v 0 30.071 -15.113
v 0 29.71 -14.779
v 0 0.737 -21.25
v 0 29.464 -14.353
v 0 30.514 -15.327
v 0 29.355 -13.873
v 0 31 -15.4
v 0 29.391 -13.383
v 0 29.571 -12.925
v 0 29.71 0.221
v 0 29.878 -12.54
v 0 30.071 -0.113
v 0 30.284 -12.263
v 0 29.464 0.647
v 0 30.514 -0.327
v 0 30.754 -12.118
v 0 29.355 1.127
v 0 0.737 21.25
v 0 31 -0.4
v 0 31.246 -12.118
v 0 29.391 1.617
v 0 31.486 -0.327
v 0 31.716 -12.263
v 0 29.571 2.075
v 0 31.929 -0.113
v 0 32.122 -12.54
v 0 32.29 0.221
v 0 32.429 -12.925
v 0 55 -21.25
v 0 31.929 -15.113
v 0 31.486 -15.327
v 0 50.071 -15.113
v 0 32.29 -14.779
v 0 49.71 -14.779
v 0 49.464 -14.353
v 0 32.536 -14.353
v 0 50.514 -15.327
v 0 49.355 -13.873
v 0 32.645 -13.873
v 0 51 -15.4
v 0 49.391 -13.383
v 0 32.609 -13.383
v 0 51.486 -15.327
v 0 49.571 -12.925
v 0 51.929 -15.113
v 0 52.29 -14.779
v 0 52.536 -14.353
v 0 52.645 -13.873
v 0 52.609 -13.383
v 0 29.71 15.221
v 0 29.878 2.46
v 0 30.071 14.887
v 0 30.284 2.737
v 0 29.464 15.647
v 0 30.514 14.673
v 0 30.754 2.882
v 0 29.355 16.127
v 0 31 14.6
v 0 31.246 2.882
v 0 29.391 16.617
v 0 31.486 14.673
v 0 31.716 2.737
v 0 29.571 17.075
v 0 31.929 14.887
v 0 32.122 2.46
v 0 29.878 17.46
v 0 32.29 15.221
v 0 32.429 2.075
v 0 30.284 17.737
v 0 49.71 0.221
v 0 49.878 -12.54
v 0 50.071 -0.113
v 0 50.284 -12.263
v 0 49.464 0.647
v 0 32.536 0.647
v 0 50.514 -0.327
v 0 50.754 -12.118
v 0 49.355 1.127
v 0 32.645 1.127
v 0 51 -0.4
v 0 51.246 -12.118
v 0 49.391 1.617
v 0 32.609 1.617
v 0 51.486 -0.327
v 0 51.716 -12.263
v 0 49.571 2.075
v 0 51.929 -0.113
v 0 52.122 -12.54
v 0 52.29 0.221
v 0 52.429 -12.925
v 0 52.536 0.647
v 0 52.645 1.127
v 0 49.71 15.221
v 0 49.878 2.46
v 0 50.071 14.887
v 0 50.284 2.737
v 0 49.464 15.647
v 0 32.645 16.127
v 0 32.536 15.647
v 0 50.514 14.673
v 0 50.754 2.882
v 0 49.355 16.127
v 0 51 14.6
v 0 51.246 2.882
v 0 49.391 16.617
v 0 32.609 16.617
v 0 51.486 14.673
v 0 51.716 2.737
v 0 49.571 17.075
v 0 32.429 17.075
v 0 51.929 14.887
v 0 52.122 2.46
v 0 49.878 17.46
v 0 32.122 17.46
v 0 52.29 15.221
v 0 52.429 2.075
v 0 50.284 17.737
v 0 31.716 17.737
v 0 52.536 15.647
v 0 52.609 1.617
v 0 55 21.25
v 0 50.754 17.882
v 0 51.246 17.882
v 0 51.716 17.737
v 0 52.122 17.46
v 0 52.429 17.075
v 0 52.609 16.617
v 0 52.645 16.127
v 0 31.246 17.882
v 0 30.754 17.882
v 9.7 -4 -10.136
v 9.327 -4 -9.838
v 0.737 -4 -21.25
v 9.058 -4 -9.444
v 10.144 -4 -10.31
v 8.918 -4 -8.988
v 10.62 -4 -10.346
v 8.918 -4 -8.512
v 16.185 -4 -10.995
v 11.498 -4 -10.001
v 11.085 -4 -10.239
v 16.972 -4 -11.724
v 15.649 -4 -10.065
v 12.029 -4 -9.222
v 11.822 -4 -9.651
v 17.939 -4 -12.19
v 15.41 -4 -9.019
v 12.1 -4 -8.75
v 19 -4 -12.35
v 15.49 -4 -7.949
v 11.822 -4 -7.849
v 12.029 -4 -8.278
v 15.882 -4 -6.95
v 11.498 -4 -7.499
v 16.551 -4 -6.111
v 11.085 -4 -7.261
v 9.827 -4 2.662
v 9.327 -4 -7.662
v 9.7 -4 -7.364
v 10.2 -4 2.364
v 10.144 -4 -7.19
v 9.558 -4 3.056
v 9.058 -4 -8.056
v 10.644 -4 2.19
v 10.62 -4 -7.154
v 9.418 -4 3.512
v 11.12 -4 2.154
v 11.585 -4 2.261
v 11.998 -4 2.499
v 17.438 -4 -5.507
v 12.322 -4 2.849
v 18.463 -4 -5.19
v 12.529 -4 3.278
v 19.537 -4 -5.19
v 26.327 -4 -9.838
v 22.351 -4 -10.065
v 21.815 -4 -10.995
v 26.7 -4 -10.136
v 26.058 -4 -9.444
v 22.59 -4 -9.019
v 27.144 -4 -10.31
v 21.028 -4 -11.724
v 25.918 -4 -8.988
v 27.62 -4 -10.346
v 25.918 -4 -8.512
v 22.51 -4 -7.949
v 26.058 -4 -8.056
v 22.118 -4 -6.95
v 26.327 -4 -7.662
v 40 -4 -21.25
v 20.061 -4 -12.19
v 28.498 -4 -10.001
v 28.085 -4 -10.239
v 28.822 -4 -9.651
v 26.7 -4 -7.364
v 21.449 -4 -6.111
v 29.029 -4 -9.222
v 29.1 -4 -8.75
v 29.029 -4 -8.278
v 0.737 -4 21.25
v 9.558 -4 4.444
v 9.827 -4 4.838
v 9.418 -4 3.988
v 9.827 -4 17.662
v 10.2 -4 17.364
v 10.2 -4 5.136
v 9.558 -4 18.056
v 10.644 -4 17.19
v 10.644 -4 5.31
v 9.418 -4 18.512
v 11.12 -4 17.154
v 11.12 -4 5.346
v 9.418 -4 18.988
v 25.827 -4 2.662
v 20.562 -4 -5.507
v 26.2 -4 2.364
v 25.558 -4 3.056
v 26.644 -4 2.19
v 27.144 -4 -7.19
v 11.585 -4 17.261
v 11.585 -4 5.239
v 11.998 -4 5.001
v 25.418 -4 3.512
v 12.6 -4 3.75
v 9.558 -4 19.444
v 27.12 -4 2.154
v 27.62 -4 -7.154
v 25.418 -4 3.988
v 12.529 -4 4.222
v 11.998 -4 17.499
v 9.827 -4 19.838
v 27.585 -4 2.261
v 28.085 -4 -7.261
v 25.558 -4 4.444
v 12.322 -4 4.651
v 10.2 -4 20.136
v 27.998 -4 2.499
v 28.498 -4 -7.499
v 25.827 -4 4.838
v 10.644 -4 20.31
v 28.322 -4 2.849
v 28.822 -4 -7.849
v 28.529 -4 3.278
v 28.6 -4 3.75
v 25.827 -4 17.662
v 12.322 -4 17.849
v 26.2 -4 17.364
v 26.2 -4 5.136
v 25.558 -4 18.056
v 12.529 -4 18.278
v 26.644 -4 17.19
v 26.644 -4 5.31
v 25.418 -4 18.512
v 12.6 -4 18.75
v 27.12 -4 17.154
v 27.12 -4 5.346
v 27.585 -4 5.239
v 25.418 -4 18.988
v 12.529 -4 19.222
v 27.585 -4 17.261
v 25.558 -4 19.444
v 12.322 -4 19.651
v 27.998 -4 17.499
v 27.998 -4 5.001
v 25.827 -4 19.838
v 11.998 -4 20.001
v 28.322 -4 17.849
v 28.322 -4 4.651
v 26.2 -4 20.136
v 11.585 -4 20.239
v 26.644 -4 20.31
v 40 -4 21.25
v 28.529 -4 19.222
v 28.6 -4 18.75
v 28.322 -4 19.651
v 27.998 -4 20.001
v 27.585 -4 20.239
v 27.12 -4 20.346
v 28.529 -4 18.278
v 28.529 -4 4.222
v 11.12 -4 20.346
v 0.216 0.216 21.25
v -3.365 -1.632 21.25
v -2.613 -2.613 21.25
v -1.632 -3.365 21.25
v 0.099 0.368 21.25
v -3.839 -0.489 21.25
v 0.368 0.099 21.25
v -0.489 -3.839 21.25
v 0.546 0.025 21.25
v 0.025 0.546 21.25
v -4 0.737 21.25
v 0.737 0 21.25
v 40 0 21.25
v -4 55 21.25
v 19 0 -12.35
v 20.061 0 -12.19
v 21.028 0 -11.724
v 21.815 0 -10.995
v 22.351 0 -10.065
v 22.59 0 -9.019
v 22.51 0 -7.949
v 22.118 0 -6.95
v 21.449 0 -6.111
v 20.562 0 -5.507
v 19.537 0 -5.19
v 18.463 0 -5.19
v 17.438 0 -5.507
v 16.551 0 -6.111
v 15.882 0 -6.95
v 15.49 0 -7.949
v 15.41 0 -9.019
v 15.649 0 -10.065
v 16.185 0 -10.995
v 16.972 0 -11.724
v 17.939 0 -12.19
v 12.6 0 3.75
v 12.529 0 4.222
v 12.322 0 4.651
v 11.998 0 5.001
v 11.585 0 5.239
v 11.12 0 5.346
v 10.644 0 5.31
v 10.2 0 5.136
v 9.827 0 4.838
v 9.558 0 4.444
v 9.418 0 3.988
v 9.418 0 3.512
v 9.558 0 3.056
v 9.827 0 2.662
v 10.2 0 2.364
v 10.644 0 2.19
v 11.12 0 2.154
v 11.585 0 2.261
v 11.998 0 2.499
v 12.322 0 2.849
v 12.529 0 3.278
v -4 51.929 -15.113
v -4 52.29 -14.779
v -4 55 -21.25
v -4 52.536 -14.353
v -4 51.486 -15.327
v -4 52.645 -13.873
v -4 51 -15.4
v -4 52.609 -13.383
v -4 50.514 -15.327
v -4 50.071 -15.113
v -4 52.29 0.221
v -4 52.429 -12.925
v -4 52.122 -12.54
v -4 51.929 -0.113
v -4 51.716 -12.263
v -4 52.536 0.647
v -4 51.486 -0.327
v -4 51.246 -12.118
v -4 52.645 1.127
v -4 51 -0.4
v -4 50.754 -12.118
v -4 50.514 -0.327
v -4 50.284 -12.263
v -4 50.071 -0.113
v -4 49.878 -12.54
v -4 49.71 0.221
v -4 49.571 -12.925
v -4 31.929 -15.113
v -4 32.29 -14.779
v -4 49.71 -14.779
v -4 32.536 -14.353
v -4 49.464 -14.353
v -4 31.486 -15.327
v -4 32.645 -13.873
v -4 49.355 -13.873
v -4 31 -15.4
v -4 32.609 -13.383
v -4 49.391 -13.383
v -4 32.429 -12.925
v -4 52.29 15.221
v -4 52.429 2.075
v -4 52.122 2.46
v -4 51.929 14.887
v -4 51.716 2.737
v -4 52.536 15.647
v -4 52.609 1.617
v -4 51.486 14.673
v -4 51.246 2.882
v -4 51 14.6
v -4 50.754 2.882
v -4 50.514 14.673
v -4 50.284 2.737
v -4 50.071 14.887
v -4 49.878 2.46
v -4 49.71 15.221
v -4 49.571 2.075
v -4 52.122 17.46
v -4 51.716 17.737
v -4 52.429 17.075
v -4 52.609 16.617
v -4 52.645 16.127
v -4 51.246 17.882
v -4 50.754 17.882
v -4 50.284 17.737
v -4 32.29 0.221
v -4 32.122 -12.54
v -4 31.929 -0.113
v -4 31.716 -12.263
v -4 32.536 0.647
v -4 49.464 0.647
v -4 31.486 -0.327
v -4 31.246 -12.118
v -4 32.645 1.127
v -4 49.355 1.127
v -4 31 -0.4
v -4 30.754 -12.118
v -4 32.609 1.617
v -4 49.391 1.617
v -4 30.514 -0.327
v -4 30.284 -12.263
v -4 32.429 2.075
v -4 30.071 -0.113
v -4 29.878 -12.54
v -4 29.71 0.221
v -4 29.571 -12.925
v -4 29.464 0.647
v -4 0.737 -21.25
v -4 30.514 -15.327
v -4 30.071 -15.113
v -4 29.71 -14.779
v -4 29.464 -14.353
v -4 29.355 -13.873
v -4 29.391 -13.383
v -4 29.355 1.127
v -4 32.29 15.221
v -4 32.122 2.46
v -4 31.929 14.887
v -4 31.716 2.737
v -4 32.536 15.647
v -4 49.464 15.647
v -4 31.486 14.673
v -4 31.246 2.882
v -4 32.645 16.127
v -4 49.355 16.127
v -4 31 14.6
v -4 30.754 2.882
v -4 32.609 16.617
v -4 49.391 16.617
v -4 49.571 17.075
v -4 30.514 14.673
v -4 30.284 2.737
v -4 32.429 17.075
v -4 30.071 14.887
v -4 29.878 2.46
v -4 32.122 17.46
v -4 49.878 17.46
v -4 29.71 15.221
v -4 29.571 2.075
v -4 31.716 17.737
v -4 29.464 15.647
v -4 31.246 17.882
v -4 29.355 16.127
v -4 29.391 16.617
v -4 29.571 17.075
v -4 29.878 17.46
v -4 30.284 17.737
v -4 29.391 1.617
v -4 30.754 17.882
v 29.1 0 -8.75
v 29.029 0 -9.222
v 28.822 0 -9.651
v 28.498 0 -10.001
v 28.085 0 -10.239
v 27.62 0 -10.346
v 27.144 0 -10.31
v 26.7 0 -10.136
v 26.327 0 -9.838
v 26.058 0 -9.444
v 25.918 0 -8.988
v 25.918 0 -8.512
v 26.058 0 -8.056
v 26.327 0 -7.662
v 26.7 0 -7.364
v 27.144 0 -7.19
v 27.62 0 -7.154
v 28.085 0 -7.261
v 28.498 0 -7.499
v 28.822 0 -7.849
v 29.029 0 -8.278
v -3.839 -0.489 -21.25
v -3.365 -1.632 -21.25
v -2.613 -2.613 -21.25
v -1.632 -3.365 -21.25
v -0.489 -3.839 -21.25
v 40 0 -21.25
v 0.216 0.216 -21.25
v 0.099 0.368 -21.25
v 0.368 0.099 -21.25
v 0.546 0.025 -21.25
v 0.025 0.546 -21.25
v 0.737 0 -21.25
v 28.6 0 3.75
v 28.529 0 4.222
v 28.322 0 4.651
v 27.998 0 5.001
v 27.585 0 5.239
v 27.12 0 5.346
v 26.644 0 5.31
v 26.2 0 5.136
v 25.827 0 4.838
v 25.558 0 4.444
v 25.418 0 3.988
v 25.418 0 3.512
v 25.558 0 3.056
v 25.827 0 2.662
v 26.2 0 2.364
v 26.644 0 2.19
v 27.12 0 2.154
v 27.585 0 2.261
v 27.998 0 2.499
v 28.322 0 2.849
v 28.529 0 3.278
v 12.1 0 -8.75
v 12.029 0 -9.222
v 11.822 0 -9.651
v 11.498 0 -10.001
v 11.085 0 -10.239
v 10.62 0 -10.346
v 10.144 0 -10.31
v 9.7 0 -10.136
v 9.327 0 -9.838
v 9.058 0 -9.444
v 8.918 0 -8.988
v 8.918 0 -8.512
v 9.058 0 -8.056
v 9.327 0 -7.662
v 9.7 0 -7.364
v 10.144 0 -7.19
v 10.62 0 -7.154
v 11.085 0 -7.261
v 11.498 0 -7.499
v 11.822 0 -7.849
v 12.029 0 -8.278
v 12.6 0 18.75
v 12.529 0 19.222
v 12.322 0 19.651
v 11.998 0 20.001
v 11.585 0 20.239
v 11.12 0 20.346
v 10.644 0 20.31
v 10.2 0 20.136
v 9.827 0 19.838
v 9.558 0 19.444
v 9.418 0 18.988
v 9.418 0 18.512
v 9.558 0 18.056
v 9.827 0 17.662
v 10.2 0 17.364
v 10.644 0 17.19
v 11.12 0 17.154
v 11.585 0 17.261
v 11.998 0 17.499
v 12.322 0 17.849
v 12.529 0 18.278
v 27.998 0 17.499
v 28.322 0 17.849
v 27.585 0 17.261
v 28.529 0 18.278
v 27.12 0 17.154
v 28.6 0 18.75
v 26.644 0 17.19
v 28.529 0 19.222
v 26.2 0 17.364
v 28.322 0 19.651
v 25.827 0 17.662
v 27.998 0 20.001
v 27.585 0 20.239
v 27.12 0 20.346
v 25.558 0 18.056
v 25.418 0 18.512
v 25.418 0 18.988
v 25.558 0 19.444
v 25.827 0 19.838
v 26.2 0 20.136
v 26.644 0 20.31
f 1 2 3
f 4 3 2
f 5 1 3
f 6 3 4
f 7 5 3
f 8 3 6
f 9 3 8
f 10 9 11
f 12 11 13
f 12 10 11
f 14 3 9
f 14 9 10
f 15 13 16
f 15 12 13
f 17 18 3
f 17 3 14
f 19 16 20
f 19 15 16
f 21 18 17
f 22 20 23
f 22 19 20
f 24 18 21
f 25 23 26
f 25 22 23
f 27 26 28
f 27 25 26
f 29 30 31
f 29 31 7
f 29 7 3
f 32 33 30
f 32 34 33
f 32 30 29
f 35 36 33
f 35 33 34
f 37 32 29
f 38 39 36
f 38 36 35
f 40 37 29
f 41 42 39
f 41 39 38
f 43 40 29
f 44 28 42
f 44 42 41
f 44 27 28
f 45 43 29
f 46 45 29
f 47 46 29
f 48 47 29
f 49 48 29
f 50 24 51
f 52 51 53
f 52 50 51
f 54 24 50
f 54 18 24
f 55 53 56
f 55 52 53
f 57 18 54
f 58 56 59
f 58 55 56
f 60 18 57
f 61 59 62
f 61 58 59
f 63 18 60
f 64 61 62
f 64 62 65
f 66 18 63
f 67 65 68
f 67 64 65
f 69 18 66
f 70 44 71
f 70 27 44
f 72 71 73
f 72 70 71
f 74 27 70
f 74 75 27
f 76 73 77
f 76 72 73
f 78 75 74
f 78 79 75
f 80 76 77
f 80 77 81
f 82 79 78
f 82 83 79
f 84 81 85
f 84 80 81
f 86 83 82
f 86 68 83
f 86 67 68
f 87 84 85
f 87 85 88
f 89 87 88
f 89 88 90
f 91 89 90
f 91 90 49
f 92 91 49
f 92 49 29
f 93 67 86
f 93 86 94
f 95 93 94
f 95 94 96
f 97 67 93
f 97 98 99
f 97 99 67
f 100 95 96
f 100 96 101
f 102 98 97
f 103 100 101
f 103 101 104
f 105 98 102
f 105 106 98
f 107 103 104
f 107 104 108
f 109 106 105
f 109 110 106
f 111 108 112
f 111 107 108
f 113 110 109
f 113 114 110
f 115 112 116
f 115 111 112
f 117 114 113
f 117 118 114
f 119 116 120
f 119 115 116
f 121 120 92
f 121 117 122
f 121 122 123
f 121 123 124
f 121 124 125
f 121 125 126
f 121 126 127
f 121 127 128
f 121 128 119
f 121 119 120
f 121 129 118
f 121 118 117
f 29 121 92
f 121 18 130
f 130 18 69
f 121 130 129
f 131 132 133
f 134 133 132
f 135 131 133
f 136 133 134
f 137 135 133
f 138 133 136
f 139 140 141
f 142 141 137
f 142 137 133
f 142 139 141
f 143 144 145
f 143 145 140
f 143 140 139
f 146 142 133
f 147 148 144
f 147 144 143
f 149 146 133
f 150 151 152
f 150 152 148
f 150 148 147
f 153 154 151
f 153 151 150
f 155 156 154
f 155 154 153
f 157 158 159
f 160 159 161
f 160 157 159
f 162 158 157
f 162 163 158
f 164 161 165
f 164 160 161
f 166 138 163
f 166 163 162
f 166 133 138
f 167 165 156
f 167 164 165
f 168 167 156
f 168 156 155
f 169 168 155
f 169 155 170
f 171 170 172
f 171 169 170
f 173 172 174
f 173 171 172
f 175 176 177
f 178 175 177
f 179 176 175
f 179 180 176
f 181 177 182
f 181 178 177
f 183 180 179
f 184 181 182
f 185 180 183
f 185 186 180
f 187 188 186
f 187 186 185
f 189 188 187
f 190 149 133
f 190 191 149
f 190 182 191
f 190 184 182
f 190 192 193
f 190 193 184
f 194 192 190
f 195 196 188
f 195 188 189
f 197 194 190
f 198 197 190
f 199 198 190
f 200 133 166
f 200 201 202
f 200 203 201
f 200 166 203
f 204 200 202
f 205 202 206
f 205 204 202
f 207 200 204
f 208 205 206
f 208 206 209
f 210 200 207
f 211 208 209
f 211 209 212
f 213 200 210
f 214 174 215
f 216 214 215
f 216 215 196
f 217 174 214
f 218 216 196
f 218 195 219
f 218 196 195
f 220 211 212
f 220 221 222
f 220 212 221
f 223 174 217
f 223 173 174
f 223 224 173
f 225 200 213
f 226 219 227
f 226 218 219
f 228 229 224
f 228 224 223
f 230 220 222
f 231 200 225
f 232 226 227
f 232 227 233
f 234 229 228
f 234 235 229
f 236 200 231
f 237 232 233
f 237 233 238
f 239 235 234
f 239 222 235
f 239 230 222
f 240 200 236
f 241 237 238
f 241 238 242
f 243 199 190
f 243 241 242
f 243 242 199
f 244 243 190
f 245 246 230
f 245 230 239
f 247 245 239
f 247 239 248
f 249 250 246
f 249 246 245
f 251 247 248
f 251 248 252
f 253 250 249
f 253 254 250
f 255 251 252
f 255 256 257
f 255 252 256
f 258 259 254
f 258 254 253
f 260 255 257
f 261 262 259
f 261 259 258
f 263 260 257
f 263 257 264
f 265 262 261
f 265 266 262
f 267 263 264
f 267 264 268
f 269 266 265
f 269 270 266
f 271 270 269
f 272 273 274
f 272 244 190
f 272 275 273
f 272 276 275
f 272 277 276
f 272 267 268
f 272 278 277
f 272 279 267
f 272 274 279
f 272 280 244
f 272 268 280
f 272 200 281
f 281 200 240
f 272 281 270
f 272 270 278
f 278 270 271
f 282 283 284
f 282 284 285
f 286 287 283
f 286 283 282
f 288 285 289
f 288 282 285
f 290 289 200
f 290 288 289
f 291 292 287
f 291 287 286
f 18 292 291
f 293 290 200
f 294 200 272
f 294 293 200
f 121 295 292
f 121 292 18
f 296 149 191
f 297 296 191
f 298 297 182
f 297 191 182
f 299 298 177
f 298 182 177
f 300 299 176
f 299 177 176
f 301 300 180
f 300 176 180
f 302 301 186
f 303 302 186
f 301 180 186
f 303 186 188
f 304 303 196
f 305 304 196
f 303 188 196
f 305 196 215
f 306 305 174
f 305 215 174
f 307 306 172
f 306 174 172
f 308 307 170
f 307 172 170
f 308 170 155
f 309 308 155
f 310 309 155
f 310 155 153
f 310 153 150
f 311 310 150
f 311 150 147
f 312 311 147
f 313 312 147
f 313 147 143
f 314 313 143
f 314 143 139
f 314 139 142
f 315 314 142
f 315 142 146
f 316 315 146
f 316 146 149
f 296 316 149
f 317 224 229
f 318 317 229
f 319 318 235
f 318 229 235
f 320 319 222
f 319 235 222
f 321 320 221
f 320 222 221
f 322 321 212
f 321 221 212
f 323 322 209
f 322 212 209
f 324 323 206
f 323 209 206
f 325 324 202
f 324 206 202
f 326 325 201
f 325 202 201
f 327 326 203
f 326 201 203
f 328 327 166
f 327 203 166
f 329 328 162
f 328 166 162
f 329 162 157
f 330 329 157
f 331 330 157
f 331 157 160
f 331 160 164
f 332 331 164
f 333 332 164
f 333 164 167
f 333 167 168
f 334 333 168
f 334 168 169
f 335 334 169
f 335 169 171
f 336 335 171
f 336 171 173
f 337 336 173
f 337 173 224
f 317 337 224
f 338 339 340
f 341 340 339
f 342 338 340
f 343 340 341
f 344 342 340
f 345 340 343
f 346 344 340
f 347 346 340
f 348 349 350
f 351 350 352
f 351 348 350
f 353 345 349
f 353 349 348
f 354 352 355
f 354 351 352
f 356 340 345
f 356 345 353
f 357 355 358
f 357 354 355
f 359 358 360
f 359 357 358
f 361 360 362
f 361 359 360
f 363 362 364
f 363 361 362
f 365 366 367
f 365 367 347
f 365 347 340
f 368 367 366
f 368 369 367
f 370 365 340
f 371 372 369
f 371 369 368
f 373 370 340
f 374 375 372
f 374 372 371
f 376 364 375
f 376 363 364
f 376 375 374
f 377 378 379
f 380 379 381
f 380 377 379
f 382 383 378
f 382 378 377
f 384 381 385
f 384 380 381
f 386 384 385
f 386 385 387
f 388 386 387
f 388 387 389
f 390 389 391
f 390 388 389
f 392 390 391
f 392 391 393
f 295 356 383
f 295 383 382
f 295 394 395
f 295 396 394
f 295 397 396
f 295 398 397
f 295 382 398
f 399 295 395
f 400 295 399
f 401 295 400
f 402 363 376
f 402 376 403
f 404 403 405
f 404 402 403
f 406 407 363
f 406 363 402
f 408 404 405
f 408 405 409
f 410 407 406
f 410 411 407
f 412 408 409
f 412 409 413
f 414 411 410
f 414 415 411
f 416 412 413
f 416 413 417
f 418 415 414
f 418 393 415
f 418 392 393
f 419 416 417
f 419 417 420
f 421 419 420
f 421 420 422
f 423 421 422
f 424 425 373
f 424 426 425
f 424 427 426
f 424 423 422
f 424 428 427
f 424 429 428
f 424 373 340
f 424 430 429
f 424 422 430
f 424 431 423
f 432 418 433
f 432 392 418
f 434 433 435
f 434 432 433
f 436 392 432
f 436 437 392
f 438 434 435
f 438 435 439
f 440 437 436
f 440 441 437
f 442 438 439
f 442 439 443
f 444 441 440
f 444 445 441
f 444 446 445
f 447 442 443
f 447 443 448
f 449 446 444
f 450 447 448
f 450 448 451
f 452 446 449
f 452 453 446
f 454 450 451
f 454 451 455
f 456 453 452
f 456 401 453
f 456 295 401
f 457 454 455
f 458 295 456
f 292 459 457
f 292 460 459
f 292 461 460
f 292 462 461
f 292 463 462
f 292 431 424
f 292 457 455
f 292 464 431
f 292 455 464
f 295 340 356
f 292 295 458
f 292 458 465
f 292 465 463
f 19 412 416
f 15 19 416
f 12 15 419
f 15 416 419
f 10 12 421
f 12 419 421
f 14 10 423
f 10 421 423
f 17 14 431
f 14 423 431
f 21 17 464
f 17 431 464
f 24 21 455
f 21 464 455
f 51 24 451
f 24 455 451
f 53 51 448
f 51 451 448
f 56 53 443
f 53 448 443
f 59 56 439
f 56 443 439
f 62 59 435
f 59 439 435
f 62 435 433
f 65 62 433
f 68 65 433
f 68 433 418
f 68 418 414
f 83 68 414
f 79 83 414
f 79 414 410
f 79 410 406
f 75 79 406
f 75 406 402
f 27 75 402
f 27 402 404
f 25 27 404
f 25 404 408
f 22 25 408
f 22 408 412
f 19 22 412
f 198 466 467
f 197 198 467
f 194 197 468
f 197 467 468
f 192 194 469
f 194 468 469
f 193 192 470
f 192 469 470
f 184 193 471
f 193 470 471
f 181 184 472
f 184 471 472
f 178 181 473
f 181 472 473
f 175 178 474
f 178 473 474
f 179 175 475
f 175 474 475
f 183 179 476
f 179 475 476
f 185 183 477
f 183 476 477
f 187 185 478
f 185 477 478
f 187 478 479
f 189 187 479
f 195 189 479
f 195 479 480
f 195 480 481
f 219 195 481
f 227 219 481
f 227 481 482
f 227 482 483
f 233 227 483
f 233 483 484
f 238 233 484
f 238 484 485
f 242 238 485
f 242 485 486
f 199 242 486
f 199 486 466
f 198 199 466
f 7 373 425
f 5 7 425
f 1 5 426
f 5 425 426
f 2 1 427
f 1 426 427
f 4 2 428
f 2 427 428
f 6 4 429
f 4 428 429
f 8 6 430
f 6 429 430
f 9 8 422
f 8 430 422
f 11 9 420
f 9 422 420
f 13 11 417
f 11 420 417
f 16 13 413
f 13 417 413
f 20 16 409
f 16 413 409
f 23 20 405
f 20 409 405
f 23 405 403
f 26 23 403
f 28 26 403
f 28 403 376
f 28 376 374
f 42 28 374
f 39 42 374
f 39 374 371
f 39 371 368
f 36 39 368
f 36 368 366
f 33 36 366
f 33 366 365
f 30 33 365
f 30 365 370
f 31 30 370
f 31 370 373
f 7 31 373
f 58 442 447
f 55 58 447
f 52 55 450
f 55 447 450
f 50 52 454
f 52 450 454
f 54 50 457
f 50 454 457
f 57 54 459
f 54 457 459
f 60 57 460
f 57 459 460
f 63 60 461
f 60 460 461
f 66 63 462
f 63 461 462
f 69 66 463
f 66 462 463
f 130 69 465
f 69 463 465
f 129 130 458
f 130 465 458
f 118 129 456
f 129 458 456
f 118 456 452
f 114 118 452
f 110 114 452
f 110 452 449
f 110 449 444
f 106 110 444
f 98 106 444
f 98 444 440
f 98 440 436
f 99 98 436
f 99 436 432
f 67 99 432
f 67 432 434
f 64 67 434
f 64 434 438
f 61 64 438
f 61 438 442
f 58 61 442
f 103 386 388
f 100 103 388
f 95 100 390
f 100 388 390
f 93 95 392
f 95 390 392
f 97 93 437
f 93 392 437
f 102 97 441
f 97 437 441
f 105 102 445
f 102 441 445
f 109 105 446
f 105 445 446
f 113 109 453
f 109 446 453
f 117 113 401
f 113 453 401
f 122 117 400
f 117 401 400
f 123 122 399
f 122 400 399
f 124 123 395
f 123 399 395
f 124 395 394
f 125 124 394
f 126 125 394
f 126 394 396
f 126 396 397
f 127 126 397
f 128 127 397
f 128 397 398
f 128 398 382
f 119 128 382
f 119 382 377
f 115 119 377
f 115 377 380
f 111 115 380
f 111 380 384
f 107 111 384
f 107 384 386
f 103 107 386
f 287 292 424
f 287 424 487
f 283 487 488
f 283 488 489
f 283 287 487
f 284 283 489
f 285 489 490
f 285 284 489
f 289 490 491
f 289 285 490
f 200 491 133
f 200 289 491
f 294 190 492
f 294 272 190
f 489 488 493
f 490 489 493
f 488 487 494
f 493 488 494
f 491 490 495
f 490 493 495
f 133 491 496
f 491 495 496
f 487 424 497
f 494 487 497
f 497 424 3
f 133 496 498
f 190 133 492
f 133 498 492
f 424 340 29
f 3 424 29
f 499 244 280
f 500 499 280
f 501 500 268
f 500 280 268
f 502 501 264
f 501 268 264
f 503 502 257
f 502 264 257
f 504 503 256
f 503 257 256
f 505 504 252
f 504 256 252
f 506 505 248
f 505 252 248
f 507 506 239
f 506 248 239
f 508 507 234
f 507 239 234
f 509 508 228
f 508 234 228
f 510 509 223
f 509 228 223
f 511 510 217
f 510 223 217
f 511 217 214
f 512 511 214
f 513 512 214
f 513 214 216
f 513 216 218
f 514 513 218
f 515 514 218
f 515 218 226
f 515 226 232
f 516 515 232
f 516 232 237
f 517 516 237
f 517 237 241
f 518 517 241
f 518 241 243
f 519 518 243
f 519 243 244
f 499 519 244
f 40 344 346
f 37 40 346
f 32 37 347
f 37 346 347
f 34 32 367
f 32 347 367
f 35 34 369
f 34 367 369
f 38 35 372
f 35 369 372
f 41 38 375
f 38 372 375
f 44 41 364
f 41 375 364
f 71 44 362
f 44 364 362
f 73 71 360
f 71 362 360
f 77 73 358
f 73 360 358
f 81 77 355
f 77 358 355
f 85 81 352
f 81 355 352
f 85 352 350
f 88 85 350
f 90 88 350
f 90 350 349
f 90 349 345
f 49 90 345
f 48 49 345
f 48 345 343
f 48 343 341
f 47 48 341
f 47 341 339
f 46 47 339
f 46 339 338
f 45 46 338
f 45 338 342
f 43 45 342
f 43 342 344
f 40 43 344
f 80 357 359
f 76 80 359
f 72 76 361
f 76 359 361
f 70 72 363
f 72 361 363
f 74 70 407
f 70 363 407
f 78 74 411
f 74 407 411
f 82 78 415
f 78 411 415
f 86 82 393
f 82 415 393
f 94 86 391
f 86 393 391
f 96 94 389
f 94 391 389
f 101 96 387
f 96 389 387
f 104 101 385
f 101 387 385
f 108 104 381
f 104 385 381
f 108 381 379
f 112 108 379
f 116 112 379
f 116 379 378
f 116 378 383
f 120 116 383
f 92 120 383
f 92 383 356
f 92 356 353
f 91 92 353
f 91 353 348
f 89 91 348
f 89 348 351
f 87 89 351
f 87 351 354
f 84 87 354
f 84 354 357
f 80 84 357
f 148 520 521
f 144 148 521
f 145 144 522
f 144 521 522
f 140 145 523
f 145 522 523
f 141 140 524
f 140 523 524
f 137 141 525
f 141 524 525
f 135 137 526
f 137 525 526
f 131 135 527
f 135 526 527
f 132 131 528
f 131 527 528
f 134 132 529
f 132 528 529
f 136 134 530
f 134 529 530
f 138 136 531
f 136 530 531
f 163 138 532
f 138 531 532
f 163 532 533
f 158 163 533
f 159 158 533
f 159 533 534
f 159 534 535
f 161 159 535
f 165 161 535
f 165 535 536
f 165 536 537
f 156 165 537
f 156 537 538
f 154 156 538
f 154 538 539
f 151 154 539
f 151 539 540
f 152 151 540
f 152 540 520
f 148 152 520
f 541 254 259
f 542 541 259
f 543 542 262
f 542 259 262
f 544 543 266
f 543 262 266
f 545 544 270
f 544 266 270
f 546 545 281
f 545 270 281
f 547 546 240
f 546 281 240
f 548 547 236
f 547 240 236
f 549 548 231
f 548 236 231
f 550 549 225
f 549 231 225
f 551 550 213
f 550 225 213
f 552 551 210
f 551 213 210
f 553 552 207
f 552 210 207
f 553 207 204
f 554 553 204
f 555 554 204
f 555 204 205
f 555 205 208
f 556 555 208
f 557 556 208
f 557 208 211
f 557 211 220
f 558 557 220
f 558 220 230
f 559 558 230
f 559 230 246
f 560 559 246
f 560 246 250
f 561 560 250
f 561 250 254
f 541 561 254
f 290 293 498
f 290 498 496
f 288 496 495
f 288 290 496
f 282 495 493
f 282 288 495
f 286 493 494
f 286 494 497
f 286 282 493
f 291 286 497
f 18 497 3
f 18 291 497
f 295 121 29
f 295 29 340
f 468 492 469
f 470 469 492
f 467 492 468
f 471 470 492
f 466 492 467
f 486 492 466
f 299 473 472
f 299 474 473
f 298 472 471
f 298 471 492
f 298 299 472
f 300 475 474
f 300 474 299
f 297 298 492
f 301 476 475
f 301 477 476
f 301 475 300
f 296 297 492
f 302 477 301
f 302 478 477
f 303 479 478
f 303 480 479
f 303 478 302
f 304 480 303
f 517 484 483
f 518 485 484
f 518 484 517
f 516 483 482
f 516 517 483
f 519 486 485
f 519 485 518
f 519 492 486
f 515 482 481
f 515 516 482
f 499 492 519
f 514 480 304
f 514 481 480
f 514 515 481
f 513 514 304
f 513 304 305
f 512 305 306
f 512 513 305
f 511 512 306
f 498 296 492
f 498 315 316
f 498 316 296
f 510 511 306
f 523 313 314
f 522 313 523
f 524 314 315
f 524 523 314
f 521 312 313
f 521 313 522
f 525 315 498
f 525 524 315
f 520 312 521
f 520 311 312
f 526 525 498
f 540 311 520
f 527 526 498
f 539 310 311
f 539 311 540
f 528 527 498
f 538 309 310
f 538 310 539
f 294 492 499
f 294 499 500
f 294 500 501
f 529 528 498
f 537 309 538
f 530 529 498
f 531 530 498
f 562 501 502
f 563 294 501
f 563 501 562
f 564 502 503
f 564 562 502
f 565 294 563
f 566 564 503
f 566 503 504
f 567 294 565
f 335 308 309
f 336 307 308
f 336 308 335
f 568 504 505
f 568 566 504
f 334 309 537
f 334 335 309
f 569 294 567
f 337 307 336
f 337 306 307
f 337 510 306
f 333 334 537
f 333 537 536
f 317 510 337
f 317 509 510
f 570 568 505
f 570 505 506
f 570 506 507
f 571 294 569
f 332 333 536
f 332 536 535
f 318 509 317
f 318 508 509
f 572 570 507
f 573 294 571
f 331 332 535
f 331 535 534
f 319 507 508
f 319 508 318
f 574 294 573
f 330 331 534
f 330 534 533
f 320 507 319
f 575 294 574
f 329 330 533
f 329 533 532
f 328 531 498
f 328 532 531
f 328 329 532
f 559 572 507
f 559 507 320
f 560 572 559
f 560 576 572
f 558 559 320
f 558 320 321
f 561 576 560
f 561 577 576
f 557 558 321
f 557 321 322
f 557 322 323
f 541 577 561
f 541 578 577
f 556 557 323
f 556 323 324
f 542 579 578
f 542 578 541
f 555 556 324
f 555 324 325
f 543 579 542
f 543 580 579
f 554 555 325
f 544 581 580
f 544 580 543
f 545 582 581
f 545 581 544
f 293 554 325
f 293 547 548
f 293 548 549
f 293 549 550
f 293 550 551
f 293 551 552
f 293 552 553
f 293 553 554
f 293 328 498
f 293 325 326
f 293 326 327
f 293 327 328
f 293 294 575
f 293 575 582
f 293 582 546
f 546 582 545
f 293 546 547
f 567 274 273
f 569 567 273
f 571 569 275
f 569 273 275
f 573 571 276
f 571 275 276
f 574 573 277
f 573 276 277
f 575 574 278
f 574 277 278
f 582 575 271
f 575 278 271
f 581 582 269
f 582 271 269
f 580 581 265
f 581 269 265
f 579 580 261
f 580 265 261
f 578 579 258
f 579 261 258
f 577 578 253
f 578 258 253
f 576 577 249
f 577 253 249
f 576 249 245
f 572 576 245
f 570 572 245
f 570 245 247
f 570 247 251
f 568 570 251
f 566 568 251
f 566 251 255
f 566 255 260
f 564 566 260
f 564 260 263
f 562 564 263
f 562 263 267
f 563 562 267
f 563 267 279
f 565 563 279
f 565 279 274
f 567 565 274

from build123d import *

# Parameters (mm, degrees)
SM_BASE_FLANGE_2_DEPTH = 21.25
HOLE_WIZARD_M3_1_D     = 3.2
SKETCH_24_R            = 3.6
CUT_EXTRUDE_2_DEPTH    = 75.381197221
M4X0_7_1_D             = 3.3
HOLE_WIZARD_M3_2_D     = 3.2
PATTERN_LINEAR_1_COUNT = 3
PATTERN_LINEAR_1_PITCH = 15


# Sheet-metal steps are written as plain solids
with BuildPart() as part:
    # 草圖16 → 基材-凸緣2 (new, symmetric)
    with BuildSketch(Plane.XY):
        with BuildLine():
            Line((40, 0), (0.7366, 0))
            ThreePointArc((0.7366, 0), (0.215745145, 0.215745145), (0, 0.7366))
            Line((0, 0.7366), (0, 55))
            Line((0, 55), (-4, 55))
            Line((-4, 55), (-4, 0.7366))
            ThreePointArc((-4, 0.7366), (-2.61268198, -2.61268198), (0.7366, -4))
            Line((0.7366, -4), (40, -4))
            Line((40, -4), (40, 0))
        make_face()
    extrude(amount=SM_BASE_FLANGE_2_DEPTH, both=True)

    # M3 餘隙孔1 (through all)
    with Locations(Plane(origin=(0, 0, 0), x_dir=(-1, 0, 0), z_dir=(0, 1, 0))):
        with Locations((-27, 18.75), (-11, 3.75), (-11, 18.75), (-27, 3.75)):
            Hole(HOLE_WIZARD_M3_1_D / 2)

    # 草圖24 → 除料-伸長2 (cut, through all)
    with BuildSketch(Plane.XZ.offset(4)):
        with Locations(Location((19, -8.75, 0), (0, 0, 270))):
            Circle(SKETCH_24_R)
    extrude(amount=-CUT_EXTRUDE_2_DEPTH, mode=Mode.SUBTRACT)

    # M4x0.7 螺紋孔1 (through all)
    with Locations(Plane(origin=(0, 0, 0), x_dir=(0, 0, 1), z_dir=(1, 0, 0))):
        with Locations((16.25, -51), (16.25, -31)):
            m4x0_7_1 = Hole(M4X0_7_1_D / 2)

    # M3 餘隙孔2 (through all)
    with Locations(Plane(origin=(0, -4, 0), x_dir=(-1, 0, 0), z_dir=(0, -1, 0))):
        with Locations((-27.5, 8.75), (-10.5, 8.75)):
            Hole(HOLE_WIZARD_M3_2_D / 2)

    # 直線複製排列1: M4x0.7 螺紋孔1 ×3
    with Locations(*[(0, 0, -i * PATTERN_LINEAR_1_PITCH) for i in range(1, PATTERN_LINEAR_1_COUNT)]):
        add(m4x0_7_1, mode=Mode.SUBTRACT)


solid = part.part
